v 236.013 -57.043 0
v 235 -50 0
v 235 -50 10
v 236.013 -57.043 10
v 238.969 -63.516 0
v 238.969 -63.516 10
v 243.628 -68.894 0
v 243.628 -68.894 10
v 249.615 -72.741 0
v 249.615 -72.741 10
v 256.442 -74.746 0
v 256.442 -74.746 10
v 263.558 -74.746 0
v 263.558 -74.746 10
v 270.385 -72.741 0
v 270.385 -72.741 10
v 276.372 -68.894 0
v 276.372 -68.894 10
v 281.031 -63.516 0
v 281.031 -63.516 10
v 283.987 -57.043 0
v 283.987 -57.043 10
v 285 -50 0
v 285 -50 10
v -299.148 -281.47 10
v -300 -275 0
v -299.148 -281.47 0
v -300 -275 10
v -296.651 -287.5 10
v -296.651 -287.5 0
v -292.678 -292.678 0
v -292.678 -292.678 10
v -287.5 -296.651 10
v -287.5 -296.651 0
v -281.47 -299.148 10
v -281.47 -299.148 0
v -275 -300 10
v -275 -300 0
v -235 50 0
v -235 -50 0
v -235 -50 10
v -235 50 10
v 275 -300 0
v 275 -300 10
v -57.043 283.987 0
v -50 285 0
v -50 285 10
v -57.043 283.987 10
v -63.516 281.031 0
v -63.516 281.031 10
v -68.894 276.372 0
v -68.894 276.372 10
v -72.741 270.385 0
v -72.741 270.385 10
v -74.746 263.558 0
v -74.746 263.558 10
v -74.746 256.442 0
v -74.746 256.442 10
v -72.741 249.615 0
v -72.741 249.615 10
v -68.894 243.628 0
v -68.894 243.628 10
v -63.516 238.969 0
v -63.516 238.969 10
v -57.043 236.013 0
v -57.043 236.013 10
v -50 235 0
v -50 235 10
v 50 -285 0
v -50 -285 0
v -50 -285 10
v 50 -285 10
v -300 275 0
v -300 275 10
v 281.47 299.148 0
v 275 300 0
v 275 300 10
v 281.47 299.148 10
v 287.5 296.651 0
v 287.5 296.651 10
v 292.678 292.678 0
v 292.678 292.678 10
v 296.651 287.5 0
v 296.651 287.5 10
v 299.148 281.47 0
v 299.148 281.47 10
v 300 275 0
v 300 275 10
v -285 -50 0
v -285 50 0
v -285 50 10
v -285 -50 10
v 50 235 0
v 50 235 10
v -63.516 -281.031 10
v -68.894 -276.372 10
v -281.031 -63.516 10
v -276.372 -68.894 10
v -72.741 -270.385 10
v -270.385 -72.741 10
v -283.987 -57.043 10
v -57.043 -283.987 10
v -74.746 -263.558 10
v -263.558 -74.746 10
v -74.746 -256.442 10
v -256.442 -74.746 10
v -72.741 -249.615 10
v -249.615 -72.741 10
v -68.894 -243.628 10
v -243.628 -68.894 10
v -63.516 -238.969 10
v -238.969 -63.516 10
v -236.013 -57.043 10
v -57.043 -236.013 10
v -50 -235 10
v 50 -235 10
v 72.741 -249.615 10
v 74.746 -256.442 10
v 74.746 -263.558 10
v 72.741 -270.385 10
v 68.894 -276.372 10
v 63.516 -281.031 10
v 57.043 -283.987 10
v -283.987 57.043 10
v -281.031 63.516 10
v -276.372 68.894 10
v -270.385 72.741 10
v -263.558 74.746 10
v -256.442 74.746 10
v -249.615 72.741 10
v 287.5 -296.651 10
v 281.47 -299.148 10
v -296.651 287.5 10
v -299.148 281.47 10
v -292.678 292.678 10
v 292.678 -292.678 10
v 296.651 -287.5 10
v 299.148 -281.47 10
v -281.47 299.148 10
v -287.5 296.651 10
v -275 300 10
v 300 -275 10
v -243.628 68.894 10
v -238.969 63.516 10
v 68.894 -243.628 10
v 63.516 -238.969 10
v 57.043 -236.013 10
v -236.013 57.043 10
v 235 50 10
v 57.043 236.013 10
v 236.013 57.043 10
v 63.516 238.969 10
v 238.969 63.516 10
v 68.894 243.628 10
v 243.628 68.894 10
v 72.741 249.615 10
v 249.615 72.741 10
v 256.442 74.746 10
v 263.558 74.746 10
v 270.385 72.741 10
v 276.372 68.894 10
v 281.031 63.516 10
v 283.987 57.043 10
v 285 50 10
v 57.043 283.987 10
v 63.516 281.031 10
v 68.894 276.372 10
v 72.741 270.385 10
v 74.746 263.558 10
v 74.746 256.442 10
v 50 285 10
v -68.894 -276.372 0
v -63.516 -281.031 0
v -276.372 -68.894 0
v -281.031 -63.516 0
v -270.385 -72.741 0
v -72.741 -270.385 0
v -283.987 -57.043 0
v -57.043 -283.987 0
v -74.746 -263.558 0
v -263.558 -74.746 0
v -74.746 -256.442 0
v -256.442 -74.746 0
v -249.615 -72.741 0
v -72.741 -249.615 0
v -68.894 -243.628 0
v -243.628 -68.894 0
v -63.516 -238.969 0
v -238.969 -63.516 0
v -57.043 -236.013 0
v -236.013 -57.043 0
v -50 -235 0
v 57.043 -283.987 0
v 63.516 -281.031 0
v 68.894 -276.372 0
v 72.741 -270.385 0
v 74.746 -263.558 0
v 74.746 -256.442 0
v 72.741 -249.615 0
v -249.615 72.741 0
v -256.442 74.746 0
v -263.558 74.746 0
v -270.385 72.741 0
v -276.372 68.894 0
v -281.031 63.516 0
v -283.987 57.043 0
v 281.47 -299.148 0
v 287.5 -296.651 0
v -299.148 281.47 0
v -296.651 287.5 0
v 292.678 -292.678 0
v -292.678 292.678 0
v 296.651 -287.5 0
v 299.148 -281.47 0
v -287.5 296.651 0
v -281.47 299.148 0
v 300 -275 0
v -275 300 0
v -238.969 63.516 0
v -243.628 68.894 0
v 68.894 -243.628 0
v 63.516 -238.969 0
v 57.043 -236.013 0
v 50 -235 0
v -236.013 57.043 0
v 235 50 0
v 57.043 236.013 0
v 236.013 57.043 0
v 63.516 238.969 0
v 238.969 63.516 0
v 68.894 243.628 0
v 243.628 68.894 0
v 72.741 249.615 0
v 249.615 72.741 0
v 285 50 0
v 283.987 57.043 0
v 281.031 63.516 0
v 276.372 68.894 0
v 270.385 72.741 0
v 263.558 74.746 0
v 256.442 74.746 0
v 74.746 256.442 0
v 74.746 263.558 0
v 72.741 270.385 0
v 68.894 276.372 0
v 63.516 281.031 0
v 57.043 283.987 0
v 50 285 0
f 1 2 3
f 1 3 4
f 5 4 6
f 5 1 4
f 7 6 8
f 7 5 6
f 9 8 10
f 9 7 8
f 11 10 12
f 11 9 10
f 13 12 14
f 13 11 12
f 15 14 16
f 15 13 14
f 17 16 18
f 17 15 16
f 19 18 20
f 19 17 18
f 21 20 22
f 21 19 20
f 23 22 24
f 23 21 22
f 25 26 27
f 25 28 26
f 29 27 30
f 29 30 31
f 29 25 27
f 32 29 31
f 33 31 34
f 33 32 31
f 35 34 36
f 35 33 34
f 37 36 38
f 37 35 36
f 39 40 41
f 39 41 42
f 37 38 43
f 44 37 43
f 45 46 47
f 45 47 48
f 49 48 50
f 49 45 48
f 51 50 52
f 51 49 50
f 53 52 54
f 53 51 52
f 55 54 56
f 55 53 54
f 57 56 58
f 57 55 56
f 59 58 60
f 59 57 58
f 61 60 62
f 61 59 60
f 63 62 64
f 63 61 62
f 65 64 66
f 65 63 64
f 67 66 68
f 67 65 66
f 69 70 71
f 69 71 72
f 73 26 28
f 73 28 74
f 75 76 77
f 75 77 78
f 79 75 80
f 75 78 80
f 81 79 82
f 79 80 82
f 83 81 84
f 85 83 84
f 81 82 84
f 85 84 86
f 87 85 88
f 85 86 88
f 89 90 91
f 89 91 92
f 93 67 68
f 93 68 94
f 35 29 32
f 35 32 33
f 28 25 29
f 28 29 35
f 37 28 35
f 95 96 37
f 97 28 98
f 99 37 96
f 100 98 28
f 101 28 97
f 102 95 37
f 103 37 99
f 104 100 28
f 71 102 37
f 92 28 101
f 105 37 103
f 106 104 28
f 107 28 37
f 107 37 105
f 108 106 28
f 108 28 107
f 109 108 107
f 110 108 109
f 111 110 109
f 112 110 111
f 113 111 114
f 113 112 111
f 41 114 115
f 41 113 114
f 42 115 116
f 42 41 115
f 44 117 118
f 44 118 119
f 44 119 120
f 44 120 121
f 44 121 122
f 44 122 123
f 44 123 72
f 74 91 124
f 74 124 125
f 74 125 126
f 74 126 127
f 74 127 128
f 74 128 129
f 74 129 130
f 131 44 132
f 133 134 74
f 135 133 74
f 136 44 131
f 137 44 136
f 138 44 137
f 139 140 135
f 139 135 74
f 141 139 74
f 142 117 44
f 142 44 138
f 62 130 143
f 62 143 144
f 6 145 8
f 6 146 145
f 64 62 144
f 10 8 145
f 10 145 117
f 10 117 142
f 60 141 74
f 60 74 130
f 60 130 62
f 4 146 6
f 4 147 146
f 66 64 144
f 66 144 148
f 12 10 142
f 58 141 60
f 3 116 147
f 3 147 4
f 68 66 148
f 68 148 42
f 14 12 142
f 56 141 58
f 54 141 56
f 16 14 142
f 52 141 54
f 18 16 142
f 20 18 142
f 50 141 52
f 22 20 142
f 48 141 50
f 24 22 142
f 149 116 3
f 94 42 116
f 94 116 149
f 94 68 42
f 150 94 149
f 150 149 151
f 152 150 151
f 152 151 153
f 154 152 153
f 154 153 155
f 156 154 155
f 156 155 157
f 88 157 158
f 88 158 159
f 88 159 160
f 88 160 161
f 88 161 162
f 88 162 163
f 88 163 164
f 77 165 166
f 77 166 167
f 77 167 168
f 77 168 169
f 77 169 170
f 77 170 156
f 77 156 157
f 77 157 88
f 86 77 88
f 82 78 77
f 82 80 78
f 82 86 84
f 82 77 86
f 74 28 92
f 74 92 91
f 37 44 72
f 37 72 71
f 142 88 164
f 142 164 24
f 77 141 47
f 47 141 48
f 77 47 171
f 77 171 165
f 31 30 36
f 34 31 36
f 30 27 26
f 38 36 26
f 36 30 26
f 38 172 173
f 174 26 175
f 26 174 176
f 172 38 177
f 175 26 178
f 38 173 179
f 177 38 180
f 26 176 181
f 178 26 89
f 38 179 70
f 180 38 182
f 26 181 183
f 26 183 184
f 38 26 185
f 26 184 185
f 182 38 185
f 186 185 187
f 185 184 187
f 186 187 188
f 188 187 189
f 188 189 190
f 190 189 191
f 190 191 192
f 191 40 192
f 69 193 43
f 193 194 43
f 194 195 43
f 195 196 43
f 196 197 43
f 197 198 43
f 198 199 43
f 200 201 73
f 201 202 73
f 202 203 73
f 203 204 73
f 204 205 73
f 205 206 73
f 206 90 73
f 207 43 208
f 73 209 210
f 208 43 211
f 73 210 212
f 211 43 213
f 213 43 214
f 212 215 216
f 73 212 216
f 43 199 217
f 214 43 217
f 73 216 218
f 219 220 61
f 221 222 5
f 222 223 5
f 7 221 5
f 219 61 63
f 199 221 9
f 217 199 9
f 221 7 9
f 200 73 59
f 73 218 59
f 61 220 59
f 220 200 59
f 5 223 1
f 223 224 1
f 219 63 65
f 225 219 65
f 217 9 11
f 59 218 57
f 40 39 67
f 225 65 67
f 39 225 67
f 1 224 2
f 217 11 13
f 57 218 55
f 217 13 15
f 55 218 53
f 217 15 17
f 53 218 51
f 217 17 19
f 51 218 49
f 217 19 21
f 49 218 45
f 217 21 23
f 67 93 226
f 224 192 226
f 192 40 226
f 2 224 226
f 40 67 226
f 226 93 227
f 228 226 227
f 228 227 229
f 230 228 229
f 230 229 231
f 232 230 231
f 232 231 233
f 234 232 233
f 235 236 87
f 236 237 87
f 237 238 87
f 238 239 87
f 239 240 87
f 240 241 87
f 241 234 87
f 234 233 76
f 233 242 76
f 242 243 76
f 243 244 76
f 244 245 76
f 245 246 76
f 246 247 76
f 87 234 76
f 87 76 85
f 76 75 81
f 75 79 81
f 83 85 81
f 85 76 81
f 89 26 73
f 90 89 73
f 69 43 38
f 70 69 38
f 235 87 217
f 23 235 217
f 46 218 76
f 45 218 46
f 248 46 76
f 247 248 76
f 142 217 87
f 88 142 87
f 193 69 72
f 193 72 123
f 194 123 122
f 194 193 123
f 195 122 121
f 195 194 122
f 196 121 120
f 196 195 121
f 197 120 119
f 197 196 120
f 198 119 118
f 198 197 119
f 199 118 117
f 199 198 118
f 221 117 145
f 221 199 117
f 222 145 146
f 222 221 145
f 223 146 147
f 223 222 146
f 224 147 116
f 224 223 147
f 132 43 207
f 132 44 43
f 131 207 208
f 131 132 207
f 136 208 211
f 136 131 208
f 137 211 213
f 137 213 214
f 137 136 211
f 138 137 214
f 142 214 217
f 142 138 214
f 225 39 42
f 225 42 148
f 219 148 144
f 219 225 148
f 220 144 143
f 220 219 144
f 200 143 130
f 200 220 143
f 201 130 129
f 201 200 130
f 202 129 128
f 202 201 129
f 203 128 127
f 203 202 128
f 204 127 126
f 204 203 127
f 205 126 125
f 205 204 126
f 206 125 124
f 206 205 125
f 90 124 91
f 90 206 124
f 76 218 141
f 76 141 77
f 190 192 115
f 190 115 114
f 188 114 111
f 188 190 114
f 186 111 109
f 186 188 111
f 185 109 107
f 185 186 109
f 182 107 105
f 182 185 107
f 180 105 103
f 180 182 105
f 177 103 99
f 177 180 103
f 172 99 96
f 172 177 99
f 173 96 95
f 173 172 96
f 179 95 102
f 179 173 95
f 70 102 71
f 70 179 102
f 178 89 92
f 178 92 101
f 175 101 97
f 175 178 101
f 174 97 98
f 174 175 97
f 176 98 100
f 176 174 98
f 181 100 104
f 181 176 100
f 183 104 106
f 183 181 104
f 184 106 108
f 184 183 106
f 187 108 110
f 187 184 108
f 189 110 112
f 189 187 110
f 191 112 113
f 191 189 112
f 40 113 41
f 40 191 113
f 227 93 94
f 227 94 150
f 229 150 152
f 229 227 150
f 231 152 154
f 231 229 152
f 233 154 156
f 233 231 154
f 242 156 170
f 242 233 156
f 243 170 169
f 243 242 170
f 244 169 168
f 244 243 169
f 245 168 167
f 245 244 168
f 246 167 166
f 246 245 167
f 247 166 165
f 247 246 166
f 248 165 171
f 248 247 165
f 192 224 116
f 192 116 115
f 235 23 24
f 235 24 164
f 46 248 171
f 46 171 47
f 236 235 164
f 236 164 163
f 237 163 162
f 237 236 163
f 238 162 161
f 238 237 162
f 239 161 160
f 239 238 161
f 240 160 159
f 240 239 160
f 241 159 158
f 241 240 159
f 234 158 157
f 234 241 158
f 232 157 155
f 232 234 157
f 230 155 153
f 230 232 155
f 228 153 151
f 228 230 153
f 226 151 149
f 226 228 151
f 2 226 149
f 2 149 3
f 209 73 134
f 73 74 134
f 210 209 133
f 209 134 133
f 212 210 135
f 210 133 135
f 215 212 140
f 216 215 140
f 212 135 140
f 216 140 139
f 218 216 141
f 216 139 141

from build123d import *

# Parameters (mm, degrees)
F0_W            = 600
F0_H            = 600
F1_DEPTH        = 10
F3_DEPTH        = 10.001
F3_COPIES_COUNT = 4
F5_R            = 25


# Not quite as in the source:
# - a pattern or mirror of a feature is missing from the dataset's text; its kind, count and spacing are read off the source's solid


with BuildPart() as f1:
    # F0 (on Top) → F1 (new body)
    with BuildSketch(Plane.XY):
        Rectangle(F0_W, F0_H)
    extrude(amount=F1_DEPTH)

    # F2 (on Top) → F3 (cut, through all)
    with BuildSketch(Plane.XY):
        with BuildLine():
            Line((-50, 235), (50, 235))
            ThreePointArc((50, 235), (75, 260), (50, 285))
            Line((50, 285), (-50, 285))
            ThreePointArc((-50, 285), (-75, 260), (-50, 235))
        make_face()
    f3 = extrude(amount=F3_DEPTH, mode=Mode.SUBTRACT)

    # F3_copies: F3 ×4 about axis
    f3_copies_axis = Axis((0, 0, 0), (0, 0, 1))
    for i in range(1, F3_COPIES_COUNT):
        add(f3.rotate(f3_copies_axis, i * 360 / F3_COPIES_COUNT), mode=Mode.SUBTRACT)

    # F5
    f5_edges = [f1.edges().sort_by_distance(p)[0] for p in [
        (-300, -300, 5),
        (-300, 300, 5),
        (300, 300, 5),
        (300, -300, 5),
    ]]
    fillet(f5_edges, radius=F5_R)


solid = f1.part
